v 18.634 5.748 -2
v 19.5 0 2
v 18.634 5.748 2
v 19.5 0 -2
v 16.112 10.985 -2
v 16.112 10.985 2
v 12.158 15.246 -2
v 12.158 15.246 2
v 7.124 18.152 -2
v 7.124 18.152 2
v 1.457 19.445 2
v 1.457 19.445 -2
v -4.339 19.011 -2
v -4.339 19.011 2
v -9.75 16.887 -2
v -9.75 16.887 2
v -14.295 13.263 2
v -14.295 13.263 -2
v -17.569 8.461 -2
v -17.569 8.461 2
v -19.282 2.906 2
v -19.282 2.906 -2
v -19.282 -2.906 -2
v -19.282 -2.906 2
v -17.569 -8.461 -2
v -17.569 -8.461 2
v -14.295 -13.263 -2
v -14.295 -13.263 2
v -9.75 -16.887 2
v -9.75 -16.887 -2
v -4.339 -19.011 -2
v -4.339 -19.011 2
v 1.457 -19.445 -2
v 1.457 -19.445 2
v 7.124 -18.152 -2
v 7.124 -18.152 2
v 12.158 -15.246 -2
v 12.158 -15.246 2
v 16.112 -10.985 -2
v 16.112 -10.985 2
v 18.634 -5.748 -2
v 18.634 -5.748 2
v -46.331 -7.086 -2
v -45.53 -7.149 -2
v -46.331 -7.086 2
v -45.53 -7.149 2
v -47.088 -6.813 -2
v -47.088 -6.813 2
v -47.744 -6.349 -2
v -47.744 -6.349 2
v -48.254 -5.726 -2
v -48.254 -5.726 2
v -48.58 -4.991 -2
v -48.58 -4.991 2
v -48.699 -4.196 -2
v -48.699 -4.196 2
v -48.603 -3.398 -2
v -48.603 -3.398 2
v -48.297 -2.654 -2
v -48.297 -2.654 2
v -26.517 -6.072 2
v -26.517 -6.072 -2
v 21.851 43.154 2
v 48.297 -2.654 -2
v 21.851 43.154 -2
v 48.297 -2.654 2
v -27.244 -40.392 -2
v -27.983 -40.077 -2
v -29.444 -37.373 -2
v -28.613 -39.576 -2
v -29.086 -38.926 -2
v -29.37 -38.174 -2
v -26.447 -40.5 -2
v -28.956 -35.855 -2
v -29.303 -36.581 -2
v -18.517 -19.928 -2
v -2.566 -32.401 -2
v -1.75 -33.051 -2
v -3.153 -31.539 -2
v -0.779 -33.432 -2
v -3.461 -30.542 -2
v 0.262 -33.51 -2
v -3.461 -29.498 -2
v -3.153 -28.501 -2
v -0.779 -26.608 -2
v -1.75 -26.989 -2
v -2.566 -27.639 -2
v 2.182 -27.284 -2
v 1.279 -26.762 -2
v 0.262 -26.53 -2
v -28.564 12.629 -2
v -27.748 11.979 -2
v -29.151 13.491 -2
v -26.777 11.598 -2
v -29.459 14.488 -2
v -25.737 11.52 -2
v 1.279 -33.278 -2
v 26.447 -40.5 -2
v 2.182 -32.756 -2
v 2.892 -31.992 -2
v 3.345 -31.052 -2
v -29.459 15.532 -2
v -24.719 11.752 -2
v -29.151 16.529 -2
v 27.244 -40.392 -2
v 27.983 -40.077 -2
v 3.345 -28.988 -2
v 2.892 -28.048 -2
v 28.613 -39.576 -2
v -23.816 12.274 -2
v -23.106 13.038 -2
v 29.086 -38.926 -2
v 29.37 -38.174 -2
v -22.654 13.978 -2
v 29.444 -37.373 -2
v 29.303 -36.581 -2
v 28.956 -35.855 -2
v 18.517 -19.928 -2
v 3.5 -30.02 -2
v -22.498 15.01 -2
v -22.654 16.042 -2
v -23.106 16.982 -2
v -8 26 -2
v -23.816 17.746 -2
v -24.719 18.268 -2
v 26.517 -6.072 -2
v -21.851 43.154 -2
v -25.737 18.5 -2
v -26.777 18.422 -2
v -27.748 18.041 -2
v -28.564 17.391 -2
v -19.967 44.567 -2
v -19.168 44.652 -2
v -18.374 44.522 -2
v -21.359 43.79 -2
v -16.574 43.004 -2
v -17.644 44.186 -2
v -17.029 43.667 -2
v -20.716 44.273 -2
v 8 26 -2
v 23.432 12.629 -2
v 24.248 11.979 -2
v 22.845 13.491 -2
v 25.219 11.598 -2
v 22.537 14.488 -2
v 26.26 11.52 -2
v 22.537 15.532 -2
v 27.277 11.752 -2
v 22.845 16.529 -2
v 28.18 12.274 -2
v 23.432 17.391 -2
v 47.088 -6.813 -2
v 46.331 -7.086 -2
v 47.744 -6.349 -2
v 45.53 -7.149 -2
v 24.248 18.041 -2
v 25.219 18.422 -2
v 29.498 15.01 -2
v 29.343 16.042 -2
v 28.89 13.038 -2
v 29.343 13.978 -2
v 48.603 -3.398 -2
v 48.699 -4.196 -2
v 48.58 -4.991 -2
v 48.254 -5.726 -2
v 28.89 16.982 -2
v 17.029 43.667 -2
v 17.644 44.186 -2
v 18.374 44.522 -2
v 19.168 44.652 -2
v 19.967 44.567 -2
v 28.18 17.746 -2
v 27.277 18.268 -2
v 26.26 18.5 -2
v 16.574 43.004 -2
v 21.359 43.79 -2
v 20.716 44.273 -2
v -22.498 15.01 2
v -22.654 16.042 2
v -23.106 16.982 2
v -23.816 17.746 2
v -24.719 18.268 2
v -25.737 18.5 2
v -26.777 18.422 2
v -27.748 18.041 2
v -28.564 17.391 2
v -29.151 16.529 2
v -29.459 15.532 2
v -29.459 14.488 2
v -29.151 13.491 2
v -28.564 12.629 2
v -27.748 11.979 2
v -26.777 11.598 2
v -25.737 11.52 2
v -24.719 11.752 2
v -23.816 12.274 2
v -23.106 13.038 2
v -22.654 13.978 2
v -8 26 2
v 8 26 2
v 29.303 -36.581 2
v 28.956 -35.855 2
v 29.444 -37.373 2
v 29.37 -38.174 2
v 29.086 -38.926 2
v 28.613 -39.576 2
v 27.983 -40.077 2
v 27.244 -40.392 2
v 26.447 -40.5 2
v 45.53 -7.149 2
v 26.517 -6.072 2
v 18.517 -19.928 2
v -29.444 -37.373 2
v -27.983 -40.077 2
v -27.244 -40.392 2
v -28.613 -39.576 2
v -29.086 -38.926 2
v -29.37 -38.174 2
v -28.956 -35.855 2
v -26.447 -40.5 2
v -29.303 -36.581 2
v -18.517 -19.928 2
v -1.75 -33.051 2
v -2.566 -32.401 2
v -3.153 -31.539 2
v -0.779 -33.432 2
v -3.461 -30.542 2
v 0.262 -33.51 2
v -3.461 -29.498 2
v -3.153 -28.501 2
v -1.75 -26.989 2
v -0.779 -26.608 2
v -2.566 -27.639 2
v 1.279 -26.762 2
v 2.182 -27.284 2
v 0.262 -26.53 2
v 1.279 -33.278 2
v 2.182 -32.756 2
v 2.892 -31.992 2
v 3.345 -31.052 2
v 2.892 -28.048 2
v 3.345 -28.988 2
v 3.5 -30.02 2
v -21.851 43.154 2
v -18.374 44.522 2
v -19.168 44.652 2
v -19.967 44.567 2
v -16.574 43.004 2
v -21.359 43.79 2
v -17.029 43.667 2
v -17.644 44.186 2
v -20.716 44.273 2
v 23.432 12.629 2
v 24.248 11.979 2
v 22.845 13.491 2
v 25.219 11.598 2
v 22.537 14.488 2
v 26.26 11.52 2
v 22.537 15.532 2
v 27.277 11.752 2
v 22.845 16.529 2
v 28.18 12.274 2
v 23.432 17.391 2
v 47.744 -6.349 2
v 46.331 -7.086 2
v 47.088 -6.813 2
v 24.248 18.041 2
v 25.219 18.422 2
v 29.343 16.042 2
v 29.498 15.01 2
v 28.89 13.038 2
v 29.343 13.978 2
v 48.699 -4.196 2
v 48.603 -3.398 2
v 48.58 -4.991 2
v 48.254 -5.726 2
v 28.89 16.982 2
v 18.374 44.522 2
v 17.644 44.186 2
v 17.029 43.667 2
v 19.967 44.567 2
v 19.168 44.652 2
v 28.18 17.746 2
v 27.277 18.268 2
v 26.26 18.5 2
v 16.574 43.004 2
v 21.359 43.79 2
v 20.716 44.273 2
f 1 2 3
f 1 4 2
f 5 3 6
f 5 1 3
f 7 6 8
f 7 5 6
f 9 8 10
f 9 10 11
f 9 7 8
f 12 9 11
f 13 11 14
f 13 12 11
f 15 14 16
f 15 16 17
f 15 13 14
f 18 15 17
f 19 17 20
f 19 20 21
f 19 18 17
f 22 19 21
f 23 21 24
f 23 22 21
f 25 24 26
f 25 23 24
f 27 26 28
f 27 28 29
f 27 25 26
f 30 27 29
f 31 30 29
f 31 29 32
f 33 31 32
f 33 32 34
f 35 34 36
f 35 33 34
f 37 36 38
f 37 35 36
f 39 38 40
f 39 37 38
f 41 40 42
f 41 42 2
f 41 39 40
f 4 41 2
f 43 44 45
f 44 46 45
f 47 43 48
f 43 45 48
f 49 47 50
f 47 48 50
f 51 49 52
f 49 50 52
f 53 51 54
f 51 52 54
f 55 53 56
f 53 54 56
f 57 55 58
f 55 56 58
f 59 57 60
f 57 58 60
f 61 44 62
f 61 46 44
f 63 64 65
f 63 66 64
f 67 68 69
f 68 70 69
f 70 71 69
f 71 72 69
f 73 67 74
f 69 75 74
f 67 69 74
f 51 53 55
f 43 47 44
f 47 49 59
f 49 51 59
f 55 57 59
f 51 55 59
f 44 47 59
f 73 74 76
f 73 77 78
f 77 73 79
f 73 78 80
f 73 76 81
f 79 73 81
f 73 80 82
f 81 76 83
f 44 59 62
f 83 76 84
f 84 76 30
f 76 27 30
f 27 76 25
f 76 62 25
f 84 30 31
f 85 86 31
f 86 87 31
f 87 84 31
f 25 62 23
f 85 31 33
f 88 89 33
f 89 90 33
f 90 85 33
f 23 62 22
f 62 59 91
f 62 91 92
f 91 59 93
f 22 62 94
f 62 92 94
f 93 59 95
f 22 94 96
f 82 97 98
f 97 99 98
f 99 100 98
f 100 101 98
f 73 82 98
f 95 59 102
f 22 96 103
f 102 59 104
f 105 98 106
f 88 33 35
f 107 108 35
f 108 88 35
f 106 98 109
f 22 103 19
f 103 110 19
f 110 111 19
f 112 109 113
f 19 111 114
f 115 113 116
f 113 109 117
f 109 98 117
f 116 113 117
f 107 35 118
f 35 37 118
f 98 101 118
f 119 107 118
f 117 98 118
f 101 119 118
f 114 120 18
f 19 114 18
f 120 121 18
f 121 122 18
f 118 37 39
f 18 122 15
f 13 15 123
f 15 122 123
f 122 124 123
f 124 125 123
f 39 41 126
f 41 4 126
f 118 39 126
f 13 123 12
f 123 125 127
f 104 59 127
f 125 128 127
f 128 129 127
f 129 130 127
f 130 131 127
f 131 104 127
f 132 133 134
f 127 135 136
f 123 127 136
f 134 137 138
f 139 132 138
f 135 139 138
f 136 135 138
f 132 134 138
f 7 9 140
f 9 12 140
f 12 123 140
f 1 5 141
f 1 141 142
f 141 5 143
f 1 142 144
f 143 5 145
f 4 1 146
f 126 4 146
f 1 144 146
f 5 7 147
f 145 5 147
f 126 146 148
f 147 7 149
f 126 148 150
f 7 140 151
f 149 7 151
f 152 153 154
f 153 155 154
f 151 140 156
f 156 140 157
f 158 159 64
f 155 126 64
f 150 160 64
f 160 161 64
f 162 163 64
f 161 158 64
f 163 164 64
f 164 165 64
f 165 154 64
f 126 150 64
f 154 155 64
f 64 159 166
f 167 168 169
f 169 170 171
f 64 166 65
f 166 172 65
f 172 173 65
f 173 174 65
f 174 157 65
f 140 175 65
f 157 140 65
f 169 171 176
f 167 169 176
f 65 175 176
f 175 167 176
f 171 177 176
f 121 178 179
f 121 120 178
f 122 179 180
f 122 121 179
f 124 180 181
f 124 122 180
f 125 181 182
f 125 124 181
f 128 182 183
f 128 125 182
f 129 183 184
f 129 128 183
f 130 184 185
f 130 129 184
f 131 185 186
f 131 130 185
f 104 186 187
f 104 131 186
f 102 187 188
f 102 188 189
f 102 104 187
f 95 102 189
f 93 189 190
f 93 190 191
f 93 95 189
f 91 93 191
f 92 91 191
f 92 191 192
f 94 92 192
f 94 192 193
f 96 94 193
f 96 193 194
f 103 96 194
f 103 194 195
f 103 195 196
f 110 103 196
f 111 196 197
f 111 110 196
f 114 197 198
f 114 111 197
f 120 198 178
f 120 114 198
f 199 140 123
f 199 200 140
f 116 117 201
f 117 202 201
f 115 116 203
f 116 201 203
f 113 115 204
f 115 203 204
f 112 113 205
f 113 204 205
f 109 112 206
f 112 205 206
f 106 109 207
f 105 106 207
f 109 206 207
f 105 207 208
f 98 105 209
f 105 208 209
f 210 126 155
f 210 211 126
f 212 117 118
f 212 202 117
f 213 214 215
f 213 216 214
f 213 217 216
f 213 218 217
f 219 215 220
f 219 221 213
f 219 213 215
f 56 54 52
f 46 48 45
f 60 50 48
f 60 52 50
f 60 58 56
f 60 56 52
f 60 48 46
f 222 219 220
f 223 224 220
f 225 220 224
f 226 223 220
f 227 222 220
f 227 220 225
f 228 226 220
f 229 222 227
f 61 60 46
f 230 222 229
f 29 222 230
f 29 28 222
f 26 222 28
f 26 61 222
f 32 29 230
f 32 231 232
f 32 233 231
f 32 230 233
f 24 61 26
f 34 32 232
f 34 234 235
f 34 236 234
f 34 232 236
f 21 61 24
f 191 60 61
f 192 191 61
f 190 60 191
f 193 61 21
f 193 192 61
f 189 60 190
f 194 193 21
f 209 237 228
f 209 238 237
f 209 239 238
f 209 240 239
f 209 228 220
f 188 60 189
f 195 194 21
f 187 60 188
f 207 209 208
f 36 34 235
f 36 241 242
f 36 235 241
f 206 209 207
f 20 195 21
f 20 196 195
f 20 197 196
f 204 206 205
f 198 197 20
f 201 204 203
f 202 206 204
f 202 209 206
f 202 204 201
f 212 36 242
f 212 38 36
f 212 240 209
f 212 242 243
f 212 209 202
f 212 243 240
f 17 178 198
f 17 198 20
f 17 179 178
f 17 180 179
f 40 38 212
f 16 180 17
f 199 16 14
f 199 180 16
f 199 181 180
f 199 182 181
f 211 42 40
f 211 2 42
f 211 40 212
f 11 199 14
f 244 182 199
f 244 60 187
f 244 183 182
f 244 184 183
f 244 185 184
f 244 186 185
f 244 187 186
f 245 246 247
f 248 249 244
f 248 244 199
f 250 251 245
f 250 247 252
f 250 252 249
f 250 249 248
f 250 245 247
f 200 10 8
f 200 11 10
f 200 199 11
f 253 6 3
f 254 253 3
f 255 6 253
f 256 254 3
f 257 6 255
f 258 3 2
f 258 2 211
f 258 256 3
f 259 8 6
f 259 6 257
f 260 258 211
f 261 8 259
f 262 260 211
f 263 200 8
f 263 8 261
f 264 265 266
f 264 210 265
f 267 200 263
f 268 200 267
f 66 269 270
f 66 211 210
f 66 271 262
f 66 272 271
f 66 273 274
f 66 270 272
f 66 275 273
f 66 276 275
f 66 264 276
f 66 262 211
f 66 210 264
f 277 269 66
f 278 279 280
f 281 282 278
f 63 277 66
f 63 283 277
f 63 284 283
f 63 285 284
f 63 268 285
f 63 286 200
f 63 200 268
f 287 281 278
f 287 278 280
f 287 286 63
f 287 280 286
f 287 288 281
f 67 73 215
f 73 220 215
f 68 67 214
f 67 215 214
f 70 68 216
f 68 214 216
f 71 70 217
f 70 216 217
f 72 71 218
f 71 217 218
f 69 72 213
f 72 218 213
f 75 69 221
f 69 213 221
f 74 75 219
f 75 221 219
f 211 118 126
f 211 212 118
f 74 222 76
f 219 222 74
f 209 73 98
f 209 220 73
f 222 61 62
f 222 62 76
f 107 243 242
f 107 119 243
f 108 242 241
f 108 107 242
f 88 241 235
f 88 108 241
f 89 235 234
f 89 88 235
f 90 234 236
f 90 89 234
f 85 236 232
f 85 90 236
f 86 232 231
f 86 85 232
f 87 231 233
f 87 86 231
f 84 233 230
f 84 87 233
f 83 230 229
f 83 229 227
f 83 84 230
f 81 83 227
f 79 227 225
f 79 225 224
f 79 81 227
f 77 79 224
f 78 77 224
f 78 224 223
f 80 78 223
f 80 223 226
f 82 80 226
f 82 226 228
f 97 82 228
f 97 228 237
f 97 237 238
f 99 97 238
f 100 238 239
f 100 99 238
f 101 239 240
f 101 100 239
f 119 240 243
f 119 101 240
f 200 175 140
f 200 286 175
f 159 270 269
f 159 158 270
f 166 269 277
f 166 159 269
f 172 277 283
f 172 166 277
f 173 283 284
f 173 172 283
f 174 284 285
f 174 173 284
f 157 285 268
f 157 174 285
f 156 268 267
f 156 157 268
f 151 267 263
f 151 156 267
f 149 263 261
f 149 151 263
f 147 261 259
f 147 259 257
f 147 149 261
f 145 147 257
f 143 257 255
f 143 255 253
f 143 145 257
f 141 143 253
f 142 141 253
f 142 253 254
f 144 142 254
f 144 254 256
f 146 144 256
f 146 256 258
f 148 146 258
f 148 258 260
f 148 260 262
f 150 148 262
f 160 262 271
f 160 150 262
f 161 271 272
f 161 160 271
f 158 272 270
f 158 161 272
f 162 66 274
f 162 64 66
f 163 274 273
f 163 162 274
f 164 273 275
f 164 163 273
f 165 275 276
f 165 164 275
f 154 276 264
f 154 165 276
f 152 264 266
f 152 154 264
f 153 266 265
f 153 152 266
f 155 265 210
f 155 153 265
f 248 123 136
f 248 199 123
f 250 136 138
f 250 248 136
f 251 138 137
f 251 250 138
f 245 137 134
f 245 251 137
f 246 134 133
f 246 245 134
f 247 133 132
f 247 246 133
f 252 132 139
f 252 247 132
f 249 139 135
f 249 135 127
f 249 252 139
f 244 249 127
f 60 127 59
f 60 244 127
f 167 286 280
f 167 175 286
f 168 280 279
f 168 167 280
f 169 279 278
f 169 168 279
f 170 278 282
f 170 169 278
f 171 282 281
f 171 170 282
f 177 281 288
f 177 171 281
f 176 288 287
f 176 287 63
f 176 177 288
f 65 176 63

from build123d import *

# Parameters (mm, degrees)
F0_R     = 3.5
F0_R_2   = 19.5
F1_DEPTH = 2
F2_R     = 3


with BuildPart() as f1:
    # F0 (on Top) → F1 (new body, symmetric)
    with BuildSketch(Plane.XY):
        Polygon((-8, 26), (-19.074029, 47.962813), (-51.074029, -7.462813), (-26.51666, -6.071797), (-18.51666, -19.928203), (-32, -40.5), (32, -40.5), (18.51666, -19.928203), (26.51666, -6.071797), (51.074029, -7.462813), (19.074029, 47.962813), (8, 26), align=None)
        with Locations((0, -30.02)):
            Circle(F0_R, mode=Mode.SUBTRACT)
        Circle(F0_R_2, mode=Mode.SUBTRACT)
        with Locations((-25.998083, 15.01)):
            Circle(F0_R, mode=Mode.SUBTRACT)
        with Locations((25.998083, 15.01)):
            Circle(F0_R, mode=Mode.SUBTRACT)
    extrude(amount=F1_DEPTH, both=True)

    # F2
    f2_edges = [f1.edges().sort_by_distance(p)[0] for p in [
        (51.074029, -7.462813, 0),
        (32, -40.5, 0),
        (-19.074029, 47.962813, 0),
        (19.074029, 47.962813, 0),
        (-51.074029, -7.462813, 0),
        (-32, -40.5, 0),
    ]]
    fillet(f2_edges, radius=F2_R)


solid = f1.part
